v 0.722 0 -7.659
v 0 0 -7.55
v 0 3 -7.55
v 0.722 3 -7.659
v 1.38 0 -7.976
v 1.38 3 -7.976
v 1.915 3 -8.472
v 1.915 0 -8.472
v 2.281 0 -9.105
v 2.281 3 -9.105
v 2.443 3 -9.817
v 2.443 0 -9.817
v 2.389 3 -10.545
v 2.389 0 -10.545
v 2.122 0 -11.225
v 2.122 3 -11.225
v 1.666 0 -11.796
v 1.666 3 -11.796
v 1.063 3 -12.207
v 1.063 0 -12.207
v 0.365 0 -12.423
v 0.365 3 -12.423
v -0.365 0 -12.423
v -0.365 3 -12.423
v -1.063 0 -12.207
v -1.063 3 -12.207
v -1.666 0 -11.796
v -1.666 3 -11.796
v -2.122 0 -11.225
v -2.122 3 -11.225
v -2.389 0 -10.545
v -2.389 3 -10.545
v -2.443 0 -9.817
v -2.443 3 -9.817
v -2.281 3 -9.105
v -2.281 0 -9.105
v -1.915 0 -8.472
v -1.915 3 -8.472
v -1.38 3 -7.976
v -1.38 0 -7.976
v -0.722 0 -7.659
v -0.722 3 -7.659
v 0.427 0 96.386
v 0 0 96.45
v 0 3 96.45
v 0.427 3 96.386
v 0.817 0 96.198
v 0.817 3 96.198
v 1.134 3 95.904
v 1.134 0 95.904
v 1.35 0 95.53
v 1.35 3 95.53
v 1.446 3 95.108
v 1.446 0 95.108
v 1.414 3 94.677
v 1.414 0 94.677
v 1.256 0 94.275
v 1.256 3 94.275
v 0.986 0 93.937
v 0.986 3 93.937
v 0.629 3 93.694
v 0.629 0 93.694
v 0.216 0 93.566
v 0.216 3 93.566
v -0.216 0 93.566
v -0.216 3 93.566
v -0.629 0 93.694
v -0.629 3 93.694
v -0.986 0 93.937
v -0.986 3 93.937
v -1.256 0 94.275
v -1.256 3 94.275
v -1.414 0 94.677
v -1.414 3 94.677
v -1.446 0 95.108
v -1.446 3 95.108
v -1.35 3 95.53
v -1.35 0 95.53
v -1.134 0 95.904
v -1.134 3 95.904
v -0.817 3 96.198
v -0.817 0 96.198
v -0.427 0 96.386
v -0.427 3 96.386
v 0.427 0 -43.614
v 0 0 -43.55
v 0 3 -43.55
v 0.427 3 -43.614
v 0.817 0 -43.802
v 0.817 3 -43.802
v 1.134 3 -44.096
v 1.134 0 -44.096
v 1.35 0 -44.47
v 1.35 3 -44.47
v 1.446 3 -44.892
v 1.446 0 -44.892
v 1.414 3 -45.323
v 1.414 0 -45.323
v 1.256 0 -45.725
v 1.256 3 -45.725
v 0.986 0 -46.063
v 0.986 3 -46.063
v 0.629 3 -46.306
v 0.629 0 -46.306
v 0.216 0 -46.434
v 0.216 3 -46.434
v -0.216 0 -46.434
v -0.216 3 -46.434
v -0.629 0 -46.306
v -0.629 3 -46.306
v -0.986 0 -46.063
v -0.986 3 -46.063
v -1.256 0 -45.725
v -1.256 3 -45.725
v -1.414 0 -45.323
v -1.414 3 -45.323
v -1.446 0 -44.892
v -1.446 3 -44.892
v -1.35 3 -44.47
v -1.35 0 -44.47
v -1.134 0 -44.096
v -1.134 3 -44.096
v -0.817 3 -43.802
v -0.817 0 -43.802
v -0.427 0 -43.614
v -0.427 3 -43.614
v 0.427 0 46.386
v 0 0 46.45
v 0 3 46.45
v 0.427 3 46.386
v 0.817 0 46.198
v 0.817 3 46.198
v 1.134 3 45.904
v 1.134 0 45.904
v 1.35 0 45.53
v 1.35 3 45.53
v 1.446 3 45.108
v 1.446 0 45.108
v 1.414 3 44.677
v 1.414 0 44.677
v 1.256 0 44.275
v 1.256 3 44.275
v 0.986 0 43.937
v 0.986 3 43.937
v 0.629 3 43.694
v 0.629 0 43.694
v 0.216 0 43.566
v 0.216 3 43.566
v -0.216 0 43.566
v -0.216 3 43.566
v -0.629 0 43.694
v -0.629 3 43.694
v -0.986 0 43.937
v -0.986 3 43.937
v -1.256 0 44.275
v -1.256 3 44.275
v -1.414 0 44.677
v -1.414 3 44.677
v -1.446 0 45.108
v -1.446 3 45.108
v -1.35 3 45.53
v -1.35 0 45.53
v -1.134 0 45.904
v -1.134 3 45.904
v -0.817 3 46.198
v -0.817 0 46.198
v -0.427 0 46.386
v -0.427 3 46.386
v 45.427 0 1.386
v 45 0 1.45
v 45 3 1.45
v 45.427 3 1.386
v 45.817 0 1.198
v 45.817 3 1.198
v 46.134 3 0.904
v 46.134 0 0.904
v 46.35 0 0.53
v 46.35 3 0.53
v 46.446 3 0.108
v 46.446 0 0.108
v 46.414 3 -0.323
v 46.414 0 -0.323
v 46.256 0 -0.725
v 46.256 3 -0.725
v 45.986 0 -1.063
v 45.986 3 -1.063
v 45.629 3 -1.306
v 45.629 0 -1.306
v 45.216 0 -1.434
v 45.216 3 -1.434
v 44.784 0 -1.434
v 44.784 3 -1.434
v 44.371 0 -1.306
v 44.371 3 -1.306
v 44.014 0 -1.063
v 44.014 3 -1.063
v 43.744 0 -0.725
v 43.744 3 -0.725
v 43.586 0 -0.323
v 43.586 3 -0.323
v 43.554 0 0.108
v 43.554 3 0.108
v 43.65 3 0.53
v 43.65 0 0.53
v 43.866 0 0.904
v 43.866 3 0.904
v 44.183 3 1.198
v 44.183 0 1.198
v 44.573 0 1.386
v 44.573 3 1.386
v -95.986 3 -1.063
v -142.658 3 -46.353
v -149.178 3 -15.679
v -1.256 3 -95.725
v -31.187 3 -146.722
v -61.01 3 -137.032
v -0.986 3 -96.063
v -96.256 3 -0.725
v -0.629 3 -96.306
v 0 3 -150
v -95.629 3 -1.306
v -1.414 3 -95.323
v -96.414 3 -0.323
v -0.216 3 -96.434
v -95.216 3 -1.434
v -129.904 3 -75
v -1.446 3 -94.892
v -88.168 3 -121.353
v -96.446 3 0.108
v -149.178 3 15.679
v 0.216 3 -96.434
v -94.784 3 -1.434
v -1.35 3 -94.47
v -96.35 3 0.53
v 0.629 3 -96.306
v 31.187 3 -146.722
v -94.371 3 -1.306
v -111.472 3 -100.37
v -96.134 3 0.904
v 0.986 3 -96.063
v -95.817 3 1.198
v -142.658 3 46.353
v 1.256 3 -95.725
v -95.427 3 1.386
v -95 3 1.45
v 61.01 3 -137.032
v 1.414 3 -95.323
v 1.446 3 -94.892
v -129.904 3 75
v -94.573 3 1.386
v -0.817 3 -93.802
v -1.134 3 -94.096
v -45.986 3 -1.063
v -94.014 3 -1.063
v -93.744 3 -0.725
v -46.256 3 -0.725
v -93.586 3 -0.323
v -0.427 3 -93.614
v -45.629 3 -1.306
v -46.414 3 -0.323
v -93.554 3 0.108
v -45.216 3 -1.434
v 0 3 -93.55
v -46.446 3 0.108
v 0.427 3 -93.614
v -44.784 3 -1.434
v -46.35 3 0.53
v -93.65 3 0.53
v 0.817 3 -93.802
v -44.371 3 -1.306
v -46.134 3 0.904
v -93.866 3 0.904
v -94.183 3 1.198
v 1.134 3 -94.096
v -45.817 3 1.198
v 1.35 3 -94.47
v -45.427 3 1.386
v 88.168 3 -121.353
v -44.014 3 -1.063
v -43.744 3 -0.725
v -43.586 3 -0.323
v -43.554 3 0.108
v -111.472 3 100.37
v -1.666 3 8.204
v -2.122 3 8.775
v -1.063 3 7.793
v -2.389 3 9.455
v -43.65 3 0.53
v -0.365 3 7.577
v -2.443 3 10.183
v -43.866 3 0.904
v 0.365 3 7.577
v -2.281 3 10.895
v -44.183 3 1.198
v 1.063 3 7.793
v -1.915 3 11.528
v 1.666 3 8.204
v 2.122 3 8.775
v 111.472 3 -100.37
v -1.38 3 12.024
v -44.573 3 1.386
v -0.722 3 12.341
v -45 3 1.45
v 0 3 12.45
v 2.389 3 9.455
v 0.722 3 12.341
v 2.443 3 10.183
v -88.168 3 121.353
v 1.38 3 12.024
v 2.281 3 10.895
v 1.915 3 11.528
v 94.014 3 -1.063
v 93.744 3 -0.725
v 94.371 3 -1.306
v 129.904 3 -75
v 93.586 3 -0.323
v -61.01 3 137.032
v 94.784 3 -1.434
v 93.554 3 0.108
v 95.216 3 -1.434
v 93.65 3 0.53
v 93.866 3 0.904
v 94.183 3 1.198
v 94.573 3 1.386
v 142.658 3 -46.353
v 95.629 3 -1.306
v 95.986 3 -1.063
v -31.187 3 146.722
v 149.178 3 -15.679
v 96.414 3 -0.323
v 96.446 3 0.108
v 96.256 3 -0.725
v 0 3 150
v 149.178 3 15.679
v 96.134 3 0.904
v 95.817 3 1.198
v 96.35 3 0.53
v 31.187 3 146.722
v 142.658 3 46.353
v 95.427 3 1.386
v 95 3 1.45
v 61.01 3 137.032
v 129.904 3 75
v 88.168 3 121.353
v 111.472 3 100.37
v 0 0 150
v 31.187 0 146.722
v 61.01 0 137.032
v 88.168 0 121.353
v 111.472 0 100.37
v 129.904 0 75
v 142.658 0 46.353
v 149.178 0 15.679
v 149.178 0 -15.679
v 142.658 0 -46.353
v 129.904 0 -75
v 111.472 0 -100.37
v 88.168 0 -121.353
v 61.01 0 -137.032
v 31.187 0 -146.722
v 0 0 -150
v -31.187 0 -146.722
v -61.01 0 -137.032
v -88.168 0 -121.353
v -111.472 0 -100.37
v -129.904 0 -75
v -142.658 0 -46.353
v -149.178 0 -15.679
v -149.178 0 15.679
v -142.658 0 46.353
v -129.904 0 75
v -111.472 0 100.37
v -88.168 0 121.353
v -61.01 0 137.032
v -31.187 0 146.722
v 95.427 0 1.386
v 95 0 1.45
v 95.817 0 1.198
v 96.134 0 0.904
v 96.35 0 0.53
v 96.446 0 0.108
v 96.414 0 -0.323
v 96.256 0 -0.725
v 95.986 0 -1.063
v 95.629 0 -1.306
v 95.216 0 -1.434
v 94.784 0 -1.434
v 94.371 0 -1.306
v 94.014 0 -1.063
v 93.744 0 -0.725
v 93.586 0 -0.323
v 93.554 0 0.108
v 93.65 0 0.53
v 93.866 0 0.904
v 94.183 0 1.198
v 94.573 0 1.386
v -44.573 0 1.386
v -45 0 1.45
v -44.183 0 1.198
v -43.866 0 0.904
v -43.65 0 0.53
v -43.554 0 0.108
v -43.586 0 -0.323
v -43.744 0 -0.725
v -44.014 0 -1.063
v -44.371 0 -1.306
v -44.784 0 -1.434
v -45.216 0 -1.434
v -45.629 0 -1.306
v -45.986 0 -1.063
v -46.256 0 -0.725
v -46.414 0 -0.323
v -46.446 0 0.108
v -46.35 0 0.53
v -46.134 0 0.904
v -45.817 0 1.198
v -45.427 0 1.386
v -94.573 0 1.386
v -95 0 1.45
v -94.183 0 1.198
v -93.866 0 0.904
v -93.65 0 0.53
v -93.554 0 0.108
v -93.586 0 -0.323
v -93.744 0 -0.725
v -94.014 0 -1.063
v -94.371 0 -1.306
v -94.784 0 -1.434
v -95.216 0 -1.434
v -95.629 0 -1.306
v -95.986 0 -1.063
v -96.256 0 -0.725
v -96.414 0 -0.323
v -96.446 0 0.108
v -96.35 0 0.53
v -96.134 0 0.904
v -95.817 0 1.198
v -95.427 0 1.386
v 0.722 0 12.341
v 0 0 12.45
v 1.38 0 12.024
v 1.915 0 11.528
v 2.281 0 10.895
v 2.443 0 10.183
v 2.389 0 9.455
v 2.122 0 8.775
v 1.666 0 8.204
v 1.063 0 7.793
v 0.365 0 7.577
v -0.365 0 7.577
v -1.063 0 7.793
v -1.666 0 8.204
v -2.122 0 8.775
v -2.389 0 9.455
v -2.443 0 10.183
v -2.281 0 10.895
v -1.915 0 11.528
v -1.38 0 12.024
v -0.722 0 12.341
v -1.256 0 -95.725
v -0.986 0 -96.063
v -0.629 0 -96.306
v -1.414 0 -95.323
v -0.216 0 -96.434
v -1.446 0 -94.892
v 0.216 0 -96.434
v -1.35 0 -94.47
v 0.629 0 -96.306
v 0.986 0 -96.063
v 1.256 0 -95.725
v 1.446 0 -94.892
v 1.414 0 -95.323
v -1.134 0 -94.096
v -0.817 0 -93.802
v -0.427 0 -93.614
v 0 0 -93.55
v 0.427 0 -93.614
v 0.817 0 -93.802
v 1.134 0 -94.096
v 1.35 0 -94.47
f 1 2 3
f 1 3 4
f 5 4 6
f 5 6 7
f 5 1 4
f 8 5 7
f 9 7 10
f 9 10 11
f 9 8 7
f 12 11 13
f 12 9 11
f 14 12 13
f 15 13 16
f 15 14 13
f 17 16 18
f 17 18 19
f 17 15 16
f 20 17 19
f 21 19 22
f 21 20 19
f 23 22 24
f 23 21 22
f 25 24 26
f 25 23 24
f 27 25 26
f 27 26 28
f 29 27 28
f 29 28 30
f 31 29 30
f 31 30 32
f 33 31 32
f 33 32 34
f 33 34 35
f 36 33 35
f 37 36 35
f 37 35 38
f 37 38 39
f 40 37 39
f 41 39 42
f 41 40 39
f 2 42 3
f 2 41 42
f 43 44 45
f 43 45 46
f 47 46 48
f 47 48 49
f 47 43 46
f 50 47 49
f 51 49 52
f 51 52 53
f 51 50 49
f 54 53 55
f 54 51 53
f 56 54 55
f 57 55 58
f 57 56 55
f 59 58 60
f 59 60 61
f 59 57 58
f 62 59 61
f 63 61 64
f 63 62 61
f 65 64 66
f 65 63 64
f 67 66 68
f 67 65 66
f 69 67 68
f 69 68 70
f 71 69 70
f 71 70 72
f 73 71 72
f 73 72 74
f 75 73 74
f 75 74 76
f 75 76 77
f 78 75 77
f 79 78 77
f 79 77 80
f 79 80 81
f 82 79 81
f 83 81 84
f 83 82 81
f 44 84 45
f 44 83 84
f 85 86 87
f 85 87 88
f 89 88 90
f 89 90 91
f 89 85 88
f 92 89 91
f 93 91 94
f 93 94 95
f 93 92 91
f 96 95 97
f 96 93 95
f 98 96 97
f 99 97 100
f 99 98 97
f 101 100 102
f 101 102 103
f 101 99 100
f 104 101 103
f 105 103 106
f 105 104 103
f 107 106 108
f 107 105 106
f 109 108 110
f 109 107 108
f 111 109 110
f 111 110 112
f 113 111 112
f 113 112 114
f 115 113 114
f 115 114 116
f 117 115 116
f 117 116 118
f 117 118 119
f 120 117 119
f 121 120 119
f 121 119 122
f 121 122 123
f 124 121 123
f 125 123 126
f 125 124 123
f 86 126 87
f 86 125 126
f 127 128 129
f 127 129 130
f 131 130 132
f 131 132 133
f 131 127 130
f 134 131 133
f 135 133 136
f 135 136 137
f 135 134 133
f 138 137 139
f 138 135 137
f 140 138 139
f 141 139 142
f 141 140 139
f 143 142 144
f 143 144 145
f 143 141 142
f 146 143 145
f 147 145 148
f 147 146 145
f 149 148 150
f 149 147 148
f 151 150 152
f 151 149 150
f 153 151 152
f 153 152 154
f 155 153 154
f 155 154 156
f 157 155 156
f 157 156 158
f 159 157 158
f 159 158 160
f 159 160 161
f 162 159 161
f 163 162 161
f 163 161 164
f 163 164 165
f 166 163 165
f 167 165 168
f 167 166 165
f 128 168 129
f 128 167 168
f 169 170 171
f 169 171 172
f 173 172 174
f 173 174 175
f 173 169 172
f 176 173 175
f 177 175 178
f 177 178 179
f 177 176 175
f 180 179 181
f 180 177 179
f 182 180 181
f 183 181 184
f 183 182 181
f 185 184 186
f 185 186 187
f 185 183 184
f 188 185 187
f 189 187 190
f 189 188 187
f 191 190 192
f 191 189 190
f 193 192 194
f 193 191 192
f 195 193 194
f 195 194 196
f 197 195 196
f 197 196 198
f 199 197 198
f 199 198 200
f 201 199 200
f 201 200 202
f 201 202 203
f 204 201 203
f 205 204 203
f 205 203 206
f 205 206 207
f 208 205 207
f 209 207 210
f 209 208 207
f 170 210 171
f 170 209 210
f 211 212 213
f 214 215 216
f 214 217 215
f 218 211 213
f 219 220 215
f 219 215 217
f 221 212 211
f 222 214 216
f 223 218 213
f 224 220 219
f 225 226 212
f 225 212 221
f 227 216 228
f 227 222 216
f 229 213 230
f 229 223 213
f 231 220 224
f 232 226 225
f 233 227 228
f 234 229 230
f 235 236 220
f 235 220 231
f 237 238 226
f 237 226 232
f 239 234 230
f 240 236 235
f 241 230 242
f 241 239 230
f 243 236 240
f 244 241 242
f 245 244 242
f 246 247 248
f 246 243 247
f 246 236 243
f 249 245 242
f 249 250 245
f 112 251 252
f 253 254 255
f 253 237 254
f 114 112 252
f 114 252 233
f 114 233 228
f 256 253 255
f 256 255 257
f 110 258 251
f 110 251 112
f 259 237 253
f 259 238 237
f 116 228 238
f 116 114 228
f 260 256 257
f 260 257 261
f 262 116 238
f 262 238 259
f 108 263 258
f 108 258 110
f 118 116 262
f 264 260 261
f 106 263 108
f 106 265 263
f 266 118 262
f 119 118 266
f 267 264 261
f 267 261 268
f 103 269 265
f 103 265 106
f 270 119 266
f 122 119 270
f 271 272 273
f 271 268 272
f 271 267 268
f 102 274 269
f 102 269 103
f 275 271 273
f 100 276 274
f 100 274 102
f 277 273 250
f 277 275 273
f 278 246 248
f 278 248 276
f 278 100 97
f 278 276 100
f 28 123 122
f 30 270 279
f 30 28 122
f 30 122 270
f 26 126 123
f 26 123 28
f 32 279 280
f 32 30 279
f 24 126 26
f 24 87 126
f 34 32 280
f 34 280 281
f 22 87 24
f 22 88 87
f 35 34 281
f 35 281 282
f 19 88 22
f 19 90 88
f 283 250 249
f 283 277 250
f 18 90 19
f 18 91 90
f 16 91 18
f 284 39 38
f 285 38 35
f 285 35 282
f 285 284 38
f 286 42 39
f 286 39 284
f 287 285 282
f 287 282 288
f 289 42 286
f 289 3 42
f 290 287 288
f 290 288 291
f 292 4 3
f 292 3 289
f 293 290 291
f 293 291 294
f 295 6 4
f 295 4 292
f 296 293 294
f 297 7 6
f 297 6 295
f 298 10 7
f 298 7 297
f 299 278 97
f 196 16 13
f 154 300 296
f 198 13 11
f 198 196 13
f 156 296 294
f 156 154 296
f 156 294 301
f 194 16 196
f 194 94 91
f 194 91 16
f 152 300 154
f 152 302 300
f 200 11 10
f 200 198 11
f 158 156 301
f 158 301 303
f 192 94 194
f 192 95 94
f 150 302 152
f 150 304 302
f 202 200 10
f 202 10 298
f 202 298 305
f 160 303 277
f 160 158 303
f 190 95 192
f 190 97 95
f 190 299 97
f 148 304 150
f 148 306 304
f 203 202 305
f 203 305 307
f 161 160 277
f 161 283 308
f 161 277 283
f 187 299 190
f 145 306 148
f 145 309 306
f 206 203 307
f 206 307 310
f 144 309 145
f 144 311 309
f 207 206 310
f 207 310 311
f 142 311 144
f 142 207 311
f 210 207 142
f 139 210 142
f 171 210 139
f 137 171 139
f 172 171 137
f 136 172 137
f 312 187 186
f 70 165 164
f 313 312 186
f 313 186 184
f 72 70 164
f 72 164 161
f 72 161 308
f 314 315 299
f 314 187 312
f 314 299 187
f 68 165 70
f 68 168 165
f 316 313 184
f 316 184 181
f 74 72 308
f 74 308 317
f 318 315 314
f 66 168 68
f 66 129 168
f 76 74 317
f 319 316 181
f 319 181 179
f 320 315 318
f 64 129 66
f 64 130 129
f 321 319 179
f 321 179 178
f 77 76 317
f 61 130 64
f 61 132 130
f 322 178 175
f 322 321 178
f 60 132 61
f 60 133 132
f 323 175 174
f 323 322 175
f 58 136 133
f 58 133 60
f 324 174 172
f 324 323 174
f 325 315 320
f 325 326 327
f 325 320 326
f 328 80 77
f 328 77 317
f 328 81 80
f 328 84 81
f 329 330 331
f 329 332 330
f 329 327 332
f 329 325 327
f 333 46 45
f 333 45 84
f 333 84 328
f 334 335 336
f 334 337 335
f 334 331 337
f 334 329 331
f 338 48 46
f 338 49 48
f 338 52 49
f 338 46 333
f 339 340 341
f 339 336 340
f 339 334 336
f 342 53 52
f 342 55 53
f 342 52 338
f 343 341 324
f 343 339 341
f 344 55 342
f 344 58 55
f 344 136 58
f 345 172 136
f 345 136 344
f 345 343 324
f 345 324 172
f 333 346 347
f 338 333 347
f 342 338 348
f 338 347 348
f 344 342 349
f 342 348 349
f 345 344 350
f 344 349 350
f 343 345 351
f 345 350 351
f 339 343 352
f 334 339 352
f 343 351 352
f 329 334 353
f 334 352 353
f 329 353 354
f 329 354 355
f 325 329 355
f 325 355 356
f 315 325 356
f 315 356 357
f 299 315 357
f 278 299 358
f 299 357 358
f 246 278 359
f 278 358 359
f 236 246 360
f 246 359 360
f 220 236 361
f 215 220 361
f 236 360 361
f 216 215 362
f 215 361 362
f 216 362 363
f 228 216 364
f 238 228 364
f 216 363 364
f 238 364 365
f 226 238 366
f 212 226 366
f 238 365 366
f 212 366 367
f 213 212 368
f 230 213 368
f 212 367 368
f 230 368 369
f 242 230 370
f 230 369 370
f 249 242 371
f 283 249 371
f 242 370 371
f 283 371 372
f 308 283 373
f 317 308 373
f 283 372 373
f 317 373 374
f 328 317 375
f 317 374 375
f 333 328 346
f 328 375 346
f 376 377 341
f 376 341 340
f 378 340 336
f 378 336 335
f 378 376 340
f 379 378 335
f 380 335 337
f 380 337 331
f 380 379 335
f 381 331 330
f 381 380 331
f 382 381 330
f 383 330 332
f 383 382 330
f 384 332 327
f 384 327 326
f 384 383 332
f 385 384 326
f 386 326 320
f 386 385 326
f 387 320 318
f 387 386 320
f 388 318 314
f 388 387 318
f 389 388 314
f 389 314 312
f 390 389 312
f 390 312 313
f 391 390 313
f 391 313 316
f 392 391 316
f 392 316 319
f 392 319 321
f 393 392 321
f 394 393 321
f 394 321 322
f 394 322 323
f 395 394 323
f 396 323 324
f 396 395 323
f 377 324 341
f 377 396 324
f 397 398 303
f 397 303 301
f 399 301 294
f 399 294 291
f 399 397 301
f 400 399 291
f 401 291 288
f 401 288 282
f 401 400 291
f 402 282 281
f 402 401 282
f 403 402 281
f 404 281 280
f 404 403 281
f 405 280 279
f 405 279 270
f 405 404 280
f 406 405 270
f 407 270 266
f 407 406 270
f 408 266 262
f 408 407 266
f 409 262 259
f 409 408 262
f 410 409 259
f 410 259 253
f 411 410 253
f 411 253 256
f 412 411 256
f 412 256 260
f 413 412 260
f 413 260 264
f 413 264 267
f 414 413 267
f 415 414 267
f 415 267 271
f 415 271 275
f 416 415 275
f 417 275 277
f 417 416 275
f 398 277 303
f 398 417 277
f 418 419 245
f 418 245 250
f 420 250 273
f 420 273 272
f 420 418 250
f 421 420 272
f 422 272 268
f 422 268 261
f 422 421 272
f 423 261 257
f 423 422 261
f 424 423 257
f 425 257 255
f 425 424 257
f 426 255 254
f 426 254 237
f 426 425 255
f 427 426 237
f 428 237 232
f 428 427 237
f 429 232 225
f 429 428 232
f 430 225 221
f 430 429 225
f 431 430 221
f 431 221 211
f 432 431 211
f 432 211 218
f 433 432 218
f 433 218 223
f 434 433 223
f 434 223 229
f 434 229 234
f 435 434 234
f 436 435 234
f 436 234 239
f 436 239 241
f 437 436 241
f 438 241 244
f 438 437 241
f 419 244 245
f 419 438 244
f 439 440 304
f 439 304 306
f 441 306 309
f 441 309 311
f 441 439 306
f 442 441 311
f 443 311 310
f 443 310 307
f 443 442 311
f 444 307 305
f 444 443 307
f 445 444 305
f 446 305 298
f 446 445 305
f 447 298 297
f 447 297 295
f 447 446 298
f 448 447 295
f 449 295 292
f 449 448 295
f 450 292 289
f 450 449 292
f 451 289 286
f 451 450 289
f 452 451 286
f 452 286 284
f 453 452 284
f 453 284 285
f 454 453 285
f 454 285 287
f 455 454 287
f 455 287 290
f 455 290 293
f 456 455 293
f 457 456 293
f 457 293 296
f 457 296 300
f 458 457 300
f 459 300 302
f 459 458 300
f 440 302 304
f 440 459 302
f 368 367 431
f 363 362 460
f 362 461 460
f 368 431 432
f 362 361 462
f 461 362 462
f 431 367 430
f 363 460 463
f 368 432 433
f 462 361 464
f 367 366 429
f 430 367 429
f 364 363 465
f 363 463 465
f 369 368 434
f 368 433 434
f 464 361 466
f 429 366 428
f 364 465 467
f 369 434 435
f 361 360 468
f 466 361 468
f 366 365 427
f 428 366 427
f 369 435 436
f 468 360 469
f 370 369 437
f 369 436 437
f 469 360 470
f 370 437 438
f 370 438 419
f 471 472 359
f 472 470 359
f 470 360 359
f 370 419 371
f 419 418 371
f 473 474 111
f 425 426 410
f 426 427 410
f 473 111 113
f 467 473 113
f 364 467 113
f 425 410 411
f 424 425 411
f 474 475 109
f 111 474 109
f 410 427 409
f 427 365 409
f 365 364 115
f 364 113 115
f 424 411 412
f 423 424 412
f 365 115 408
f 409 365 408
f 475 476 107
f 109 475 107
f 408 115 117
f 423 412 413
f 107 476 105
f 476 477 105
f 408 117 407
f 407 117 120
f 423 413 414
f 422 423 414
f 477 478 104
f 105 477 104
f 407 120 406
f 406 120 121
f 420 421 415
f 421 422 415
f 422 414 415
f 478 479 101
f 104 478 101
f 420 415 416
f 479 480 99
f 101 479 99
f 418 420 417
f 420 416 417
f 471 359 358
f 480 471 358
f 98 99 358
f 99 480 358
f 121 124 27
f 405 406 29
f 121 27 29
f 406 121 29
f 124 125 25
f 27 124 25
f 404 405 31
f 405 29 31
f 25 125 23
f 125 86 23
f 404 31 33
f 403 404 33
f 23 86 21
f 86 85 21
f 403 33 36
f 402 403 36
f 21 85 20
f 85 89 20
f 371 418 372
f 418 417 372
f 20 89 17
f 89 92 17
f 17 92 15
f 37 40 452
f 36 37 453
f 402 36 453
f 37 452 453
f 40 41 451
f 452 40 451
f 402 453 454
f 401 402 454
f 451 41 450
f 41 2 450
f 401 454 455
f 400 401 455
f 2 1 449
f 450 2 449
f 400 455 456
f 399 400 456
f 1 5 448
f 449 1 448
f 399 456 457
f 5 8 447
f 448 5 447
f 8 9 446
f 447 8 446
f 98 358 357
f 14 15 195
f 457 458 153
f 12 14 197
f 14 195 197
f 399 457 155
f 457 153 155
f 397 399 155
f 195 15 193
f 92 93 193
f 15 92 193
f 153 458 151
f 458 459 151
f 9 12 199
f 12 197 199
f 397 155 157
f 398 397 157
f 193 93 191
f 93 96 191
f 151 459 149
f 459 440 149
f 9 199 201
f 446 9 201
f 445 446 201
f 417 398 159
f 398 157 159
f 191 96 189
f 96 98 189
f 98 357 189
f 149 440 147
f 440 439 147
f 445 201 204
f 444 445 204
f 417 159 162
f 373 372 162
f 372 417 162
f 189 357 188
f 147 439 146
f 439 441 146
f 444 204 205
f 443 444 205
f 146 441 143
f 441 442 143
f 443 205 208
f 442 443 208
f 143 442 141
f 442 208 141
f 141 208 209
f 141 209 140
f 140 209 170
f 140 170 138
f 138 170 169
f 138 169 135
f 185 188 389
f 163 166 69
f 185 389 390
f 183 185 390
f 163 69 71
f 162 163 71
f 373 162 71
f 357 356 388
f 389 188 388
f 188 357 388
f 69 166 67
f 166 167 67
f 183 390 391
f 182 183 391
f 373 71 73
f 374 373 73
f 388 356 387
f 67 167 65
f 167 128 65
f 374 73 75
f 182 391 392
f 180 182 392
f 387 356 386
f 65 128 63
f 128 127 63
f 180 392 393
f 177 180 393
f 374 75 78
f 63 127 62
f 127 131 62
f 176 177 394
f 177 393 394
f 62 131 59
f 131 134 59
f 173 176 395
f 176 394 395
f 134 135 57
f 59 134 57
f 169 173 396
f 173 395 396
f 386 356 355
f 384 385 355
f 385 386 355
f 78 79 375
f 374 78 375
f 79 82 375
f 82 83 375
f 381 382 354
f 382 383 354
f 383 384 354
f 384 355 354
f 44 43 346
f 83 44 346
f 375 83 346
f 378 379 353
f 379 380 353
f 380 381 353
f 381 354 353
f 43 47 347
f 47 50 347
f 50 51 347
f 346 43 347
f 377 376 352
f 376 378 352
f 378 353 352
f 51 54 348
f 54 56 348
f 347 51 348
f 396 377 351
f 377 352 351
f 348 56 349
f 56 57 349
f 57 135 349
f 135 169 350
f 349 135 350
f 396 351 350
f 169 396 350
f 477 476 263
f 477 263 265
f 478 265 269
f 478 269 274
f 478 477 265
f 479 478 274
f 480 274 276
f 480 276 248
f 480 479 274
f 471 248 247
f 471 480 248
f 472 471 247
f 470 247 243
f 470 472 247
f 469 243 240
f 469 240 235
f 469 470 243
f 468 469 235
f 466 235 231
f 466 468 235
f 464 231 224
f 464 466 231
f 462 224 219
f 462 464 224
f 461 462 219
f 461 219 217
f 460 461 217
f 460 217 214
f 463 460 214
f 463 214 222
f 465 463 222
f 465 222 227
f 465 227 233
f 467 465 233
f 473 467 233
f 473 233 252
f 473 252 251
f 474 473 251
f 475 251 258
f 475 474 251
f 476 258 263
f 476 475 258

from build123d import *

# Parameters (mm, degrees)
SKETCH1_R           = 150
SKETCH1_R_2         = 2.45
SKETCH1_R_3         = 1.45
BOSS_EXTRUDE1_DEPTH = 3


with BuildPart() as part:
    # Sketch1 → Boss-Extrude1 (new body)
    with BuildSketch(Plane(origin=(0, 0, 0), x_dir=(1, 0, 0), z_dir=(0, 1, 0))):
        with Locations(Location((0, 0, 0), (0, 0, 270))):
            Circle(SKETCH1_R)
        with Locations(Location((0, 10, 0), (0, 0, 270))):
            Circle(SKETCH1_R_2, mode=Mode.SUBTRACT)
        with Locations(Location((0, -10, 0), (0, 0, 270))):
            Circle(SKETCH1_R_2, mode=Mode.SUBTRACT)
        with Locations(Location((45, 0, 0), (0, 0, 270))):
            Circle(SKETCH1_R_3, mode=Mode.SUBTRACT)
        with Locations(Location((95, 0, 0), (0, 0, 270))):
            Circle(SKETCH1_R_3, mode=Mode.SUBTRACT)
        with Locations(Location((0, -45, 0), (0, 0, 270))):
            Circle(SKETCH1_R_3, mode=Mode.SUBTRACT)
        with Locations(Location((0, -95, 0), (0, 0, 270))):
            Circle(SKETCH1_R_3, mode=Mode.SUBTRACT)
        with Locations(Location((-95, 0, 0), (0, 0, 270))):
            Circle(SKETCH1_R_3, mode=Mode.SUBTRACT)
        with Locations(Location((-45, 0, 0), (0, 0, 270))):
            Circle(SKETCH1_R_3, mode=Mode.SUBTRACT)
        with Locations(Location((0, 95, 0), (0, 0, 270))):
            Circle(SKETCH1_R_3, mode=Mode.SUBTRACT)
        with Locations(Location((0, 45, 0), (0, 0, 270))):
            Circle(SKETCH1_R_3, mode=Mode.SUBTRACT)
    extrude(amount=BOSS_EXTRUDE1_DEPTH)


solid = part.part
